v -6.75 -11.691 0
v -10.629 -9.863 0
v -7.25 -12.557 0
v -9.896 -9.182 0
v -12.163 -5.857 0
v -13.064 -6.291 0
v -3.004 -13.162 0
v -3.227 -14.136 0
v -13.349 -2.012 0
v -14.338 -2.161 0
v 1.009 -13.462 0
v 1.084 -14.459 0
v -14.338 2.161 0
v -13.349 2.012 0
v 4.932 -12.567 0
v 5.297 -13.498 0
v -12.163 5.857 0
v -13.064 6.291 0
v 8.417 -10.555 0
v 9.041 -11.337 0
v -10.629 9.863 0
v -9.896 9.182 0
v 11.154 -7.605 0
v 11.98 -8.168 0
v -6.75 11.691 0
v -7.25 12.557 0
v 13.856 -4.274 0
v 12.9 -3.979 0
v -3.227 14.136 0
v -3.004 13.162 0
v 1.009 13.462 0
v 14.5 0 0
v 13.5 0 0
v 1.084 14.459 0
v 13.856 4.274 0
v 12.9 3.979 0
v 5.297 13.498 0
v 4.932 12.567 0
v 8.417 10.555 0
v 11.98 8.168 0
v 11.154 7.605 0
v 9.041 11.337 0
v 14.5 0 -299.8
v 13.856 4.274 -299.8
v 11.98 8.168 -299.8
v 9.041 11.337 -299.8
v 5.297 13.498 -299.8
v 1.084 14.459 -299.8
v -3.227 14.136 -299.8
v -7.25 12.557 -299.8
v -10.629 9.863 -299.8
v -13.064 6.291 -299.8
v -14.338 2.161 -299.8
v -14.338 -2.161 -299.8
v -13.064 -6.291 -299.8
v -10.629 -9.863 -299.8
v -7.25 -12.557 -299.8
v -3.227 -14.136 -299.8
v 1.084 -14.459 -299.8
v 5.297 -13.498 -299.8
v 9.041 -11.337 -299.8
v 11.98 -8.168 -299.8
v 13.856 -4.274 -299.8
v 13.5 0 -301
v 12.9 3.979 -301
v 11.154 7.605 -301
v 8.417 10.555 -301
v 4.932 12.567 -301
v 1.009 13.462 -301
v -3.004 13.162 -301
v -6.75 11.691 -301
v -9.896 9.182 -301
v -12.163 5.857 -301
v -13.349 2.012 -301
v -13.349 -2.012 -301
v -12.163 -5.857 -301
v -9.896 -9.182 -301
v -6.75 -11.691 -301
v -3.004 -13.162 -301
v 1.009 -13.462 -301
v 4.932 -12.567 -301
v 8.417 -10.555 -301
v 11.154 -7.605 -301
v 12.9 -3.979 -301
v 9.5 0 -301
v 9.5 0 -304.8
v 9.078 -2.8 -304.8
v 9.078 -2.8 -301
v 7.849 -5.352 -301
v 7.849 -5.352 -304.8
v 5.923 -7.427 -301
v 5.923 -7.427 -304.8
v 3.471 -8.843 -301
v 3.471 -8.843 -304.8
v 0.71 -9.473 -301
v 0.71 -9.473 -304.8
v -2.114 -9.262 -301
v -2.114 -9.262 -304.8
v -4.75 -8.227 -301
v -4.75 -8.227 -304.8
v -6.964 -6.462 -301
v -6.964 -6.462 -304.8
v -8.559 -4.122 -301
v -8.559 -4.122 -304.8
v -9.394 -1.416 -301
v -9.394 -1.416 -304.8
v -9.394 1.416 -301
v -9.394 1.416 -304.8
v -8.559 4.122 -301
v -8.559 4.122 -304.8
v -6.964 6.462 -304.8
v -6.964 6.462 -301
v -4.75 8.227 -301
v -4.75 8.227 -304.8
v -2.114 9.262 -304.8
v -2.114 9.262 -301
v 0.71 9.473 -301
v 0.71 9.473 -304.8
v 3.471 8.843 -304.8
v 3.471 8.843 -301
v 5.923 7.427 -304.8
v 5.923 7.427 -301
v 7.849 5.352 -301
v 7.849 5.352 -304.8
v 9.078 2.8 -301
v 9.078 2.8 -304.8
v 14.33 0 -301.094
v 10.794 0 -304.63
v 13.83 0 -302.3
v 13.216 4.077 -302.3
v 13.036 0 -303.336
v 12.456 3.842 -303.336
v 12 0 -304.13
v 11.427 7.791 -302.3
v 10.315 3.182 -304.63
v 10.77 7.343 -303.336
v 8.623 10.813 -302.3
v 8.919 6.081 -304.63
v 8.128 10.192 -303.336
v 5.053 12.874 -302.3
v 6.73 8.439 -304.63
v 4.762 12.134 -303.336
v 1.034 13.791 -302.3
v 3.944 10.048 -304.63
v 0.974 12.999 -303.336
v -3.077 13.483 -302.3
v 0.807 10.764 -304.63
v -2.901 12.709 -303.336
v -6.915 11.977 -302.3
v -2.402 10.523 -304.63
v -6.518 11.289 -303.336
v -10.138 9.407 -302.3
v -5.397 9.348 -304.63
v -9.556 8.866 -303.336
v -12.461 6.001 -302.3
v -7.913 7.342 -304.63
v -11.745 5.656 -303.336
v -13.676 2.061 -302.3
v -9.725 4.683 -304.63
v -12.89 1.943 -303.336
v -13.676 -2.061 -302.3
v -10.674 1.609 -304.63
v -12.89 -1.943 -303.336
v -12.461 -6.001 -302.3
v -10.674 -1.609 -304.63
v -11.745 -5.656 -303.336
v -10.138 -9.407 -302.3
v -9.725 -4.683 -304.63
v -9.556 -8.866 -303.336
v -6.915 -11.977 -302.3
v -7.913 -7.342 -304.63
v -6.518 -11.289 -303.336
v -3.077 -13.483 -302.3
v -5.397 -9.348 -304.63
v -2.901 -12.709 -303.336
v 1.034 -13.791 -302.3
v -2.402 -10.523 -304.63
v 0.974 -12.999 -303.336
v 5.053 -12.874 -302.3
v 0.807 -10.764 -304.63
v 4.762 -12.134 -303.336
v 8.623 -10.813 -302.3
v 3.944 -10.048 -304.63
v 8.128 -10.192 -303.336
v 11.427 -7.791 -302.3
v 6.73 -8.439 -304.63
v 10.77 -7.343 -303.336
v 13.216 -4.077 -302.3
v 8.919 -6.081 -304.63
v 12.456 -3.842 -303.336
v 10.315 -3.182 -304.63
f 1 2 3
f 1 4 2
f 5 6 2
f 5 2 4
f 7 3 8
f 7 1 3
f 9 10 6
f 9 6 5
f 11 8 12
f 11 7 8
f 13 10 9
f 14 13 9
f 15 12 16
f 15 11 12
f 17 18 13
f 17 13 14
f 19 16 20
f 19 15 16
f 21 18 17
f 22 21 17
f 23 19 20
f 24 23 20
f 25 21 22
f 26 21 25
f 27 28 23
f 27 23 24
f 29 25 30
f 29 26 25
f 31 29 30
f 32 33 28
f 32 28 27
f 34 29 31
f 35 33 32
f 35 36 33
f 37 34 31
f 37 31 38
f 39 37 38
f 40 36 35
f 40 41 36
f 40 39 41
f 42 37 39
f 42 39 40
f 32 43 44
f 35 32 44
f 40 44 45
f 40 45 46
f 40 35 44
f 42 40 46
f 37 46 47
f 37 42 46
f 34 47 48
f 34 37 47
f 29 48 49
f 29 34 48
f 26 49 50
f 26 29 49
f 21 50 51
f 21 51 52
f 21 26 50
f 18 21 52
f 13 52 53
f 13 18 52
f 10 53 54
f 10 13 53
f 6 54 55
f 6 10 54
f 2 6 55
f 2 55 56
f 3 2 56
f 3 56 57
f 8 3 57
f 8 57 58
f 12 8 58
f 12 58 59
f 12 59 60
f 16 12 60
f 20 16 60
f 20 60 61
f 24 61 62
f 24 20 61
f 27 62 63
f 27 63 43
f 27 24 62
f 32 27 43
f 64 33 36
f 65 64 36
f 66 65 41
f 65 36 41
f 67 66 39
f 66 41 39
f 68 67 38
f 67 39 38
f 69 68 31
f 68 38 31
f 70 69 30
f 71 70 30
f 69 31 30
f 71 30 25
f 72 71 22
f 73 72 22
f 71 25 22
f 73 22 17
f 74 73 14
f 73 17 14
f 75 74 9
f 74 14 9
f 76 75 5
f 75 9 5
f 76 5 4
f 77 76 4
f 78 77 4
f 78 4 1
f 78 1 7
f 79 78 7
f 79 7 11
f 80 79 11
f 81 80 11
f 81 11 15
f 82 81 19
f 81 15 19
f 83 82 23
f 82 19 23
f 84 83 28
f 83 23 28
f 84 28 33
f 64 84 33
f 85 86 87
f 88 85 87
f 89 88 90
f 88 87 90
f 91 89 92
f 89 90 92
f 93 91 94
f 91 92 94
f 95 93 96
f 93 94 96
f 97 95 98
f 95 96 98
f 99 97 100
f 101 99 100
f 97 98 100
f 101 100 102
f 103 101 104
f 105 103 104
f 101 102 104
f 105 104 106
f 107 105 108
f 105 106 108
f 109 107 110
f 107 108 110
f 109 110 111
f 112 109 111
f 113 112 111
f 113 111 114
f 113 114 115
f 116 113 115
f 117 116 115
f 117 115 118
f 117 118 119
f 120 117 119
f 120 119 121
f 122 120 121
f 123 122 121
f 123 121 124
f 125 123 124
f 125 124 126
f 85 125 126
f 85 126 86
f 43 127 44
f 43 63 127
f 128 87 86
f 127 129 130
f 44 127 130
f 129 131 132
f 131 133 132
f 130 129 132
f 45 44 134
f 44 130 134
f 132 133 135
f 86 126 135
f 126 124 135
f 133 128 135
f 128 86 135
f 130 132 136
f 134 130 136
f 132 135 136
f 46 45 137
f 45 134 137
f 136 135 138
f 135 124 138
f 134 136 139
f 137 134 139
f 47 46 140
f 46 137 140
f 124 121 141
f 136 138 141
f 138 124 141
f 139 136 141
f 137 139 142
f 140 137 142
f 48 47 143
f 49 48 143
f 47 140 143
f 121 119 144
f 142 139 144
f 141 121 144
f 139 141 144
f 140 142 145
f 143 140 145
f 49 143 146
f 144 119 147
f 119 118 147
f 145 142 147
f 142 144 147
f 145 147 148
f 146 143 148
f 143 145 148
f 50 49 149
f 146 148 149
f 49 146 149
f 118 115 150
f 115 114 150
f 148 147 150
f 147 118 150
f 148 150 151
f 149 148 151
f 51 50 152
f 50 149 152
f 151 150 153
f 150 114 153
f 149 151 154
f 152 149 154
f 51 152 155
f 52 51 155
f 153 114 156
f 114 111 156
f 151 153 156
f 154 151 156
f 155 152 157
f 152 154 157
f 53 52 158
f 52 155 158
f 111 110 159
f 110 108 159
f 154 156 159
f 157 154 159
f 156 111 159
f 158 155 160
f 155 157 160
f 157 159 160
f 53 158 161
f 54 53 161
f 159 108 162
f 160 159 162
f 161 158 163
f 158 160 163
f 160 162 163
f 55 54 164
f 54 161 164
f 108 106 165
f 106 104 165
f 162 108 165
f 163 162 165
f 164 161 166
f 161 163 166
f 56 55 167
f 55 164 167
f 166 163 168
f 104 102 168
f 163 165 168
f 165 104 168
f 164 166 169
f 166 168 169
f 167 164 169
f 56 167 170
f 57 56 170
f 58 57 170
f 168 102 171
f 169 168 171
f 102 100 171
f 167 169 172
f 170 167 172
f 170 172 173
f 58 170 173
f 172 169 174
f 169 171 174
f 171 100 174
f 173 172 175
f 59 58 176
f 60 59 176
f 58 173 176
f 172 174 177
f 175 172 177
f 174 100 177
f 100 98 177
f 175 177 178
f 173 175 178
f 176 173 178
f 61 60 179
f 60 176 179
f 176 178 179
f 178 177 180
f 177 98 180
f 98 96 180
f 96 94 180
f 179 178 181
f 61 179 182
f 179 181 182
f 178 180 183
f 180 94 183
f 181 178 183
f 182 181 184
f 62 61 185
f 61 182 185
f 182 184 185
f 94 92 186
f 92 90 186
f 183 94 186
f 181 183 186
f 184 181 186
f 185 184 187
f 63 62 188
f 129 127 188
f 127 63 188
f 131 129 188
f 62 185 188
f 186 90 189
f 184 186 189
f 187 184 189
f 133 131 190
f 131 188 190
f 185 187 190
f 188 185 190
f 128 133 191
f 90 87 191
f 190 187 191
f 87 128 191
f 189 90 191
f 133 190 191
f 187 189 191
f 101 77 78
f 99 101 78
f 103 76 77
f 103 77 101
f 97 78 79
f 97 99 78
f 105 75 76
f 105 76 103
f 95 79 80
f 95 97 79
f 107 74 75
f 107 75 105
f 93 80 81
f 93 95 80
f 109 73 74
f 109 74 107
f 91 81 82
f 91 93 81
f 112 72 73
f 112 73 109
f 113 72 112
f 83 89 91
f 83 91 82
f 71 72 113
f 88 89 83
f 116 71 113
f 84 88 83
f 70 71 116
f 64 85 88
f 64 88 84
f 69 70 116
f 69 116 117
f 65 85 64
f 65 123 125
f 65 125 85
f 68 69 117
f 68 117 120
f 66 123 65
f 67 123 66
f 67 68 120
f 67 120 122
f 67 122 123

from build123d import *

# Parameters (mm, degrees)
SKETCH1_R           = 14.5
BOSS_EXTRUDE1_DEPTH = 304.8
SKETCH2_R           = 13.5
CUT_EXTRUDE1_DEPTH  = 301
FILLET2_R           = 5
SKETCH8_R           = 9.5
CUT_EXTRUDE2_DEPTH  = 10


with BuildPart() as part:
    # Sketch1 → Boss-Extrude1 (new body)
    with BuildSketch(Plane.XY):
        Circle(SKETCH1_R)
    extrude(amount=-BOSS_EXTRUDE1_DEPTH)

    # Sketch2 → Cut-Extrude1 (cut)
    with BuildSketch(Plane.XY):
        Circle(SKETCH2_R)
    extrude(amount=-CUT_EXTRUDE1_DEPTH, mode=Mode.SUBTRACT)

    # Fillet2
    fillet2_edges = [part.edges().sort_by_distance(p)[0] for p in [
        (-14.5, 0, -304.8),
    ]]
    fillet(fillet2_edges, radius=FILLET2_R)

    # Sketch8 → Cut-Extrude2 (cut)
    with BuildSketch(Plane(origin=(0, 0, -304.8), x_dir=(-1, 0, 0), z_dir=(0, 0, -1))):
        with Locations(Location((0, 0, 0), (0, 0, 180))):
            Circle(SKETCH8_R)
    extrude(amount=-CUT_EXTRUDE2_DEPTH, mode=Mode.SUBTRACT)


solid = part.part
